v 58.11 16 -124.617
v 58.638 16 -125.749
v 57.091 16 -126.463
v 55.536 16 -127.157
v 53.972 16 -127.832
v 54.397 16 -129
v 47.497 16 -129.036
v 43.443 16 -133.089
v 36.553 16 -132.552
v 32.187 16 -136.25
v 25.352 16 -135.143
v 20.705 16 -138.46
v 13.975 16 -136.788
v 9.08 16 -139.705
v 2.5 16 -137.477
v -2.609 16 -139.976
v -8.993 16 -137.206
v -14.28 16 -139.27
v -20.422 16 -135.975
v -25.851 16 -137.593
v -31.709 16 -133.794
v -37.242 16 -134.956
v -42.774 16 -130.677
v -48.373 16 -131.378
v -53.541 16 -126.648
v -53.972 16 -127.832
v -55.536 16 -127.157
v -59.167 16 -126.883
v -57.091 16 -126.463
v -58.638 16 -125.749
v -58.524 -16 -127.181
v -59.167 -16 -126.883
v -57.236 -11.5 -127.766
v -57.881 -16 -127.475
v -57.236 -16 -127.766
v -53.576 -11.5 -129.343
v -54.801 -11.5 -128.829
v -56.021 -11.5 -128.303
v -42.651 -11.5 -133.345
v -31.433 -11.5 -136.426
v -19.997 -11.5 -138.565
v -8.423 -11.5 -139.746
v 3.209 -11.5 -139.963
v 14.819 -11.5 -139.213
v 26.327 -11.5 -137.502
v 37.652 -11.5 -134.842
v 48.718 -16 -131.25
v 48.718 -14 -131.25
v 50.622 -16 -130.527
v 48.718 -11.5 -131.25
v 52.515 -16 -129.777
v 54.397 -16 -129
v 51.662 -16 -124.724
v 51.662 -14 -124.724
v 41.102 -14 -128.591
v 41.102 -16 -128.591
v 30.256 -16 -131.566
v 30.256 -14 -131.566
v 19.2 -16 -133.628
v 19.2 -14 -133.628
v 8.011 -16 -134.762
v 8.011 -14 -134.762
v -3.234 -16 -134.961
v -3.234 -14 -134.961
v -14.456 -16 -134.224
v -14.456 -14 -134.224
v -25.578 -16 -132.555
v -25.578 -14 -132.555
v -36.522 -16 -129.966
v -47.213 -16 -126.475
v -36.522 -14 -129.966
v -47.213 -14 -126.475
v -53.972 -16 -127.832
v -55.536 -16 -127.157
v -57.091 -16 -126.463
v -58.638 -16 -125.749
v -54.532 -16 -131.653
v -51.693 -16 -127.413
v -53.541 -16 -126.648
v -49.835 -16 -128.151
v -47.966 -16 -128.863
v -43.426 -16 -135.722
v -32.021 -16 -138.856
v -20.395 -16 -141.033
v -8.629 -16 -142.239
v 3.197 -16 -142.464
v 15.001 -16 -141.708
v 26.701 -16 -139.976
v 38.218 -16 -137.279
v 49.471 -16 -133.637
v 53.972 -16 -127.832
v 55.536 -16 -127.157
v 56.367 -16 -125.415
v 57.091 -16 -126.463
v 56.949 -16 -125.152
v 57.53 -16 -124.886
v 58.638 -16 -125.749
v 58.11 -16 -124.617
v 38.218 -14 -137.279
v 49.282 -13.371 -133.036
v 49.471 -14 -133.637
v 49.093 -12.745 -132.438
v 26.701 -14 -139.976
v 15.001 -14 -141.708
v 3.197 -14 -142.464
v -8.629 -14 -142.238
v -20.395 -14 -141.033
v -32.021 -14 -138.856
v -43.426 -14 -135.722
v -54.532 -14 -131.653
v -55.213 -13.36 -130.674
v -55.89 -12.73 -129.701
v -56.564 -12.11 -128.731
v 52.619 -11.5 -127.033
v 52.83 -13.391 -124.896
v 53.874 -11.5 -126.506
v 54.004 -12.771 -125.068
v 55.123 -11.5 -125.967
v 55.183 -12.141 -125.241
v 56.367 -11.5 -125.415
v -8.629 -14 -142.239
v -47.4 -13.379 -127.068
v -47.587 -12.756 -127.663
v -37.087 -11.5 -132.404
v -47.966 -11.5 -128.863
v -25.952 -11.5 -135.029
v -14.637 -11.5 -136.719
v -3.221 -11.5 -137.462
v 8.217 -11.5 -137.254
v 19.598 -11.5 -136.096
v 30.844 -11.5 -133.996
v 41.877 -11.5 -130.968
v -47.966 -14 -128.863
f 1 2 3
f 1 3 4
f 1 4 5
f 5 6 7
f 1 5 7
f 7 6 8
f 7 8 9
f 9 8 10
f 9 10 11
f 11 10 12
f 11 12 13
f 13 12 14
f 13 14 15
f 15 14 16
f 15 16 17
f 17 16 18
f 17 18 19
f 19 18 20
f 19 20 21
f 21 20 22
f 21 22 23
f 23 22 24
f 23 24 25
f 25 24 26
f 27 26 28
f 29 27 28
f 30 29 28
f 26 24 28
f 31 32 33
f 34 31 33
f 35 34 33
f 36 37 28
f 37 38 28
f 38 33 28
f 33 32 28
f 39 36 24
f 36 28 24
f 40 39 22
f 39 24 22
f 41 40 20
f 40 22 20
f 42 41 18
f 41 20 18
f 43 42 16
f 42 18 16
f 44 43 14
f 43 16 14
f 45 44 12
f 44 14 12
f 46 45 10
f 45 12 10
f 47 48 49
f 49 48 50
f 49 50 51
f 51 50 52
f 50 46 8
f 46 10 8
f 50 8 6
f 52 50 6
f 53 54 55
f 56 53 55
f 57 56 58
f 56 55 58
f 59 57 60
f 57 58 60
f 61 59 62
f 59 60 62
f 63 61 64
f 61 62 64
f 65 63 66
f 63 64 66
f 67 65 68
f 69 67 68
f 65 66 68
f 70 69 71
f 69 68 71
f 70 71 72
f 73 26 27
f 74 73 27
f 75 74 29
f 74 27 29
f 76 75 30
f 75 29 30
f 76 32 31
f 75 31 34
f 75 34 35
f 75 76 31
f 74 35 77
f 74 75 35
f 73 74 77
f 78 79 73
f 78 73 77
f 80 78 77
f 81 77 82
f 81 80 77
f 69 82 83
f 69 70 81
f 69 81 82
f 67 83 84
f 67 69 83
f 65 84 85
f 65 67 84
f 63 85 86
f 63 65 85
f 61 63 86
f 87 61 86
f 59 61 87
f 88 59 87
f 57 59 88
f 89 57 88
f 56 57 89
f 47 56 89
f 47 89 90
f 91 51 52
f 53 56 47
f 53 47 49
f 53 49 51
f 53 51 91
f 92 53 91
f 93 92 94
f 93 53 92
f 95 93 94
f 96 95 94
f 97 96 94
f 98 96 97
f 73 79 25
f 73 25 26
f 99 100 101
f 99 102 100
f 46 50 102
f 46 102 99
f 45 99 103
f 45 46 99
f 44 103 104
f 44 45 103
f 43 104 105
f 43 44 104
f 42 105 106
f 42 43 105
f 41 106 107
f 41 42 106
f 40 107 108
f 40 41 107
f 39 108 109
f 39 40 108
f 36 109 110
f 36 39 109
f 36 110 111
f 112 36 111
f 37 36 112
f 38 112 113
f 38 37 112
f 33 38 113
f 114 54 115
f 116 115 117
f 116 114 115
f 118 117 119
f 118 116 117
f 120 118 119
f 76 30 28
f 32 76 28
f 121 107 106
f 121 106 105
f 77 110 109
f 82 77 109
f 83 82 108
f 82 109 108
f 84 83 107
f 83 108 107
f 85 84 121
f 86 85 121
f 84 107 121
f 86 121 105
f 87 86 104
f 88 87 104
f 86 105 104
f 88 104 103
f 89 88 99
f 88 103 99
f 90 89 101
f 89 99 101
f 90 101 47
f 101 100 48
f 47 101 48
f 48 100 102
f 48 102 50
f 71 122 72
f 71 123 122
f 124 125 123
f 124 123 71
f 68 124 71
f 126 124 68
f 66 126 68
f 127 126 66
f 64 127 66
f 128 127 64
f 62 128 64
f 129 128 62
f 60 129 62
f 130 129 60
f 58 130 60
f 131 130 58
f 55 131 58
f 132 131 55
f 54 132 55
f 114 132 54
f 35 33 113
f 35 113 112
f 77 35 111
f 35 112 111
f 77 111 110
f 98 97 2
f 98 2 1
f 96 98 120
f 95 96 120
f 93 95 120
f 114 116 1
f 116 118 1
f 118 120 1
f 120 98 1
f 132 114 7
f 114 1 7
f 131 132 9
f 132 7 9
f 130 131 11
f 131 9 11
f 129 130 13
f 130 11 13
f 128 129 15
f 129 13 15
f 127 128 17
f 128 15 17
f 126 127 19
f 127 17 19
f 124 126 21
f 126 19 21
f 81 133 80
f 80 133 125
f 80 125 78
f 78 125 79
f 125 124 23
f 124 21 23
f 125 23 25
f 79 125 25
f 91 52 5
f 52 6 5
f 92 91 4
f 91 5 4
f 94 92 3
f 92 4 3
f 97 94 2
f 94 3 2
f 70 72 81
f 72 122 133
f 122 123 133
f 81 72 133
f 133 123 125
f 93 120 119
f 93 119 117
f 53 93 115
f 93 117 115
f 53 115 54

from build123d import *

# Parameters (mm, degrees)
BOSS_EXTRUDE1_DEPTH = 16
BOSS_EXTRUDE2_START = -2
BOSS_EXTRUDE2_DEPTH = 2
CHAMFER2_SIZE       = 2.5


with BuildPart() as part:
    # Sketch2 → Boss-Extrude1 (new, symmetric)
    with BuildSketch(Plane(origin=(0, 0, 0), x_dir=(1, 0, 0), z_dir=(0, 1, 0))):
        with BuildLine():
            Line((-58.637924155, 125.749434155), (-59.166556644, 126.883090185))
            ThreePointArc((-59.166556644, 126.883090185), (-2.609123321, 139.975685301), (54.396940678, 128.999894748))
            Line((54.396940678, 128.999894748), (53.971953665, 127.832252528))
            ThreePointArc((53.971953665, 127.832252528), (56.314568974, 126.8124168), (58.637924155, 125.749434155))
            Line((58.637924155, 125.749434155), (58.110010989, 124.617320718))
            ThreePointArc((58.110010989, 124.617320718), (2.5, 137.477270849), (-53.540801289, 126.647671109))
            Line((-53.540801289, 126.647671109), (-53.971953665, 127.832252528))
            ThreePointArc((-53.971953665, 127.832252528), (-56.314568974, 126.8124168), (-58.637924155, 125.749434155))
        make_face()
    extrude(amount=BOSS_EXTRUDE1_DEPTH, both=True)

    # Sketch3 → Boss-Extrude2 (add)
    with BuildSketch(Plane.XZ.offset(16).offset(BOSS_EXTRUDE2_START)):
        with BuildLine():
            Line((49.470958786, -133.637099029), (48.718270464, -131.249876659))
            ThreePointArc((48.718270464, -131.249876659), (-2.609123321, -139.975685301), (-53.575680531, -129.343134552))
            Line((-53.575680531, -129.343134552), (-58.637924155, -125.749434155))
            Line((-58.637924155, -125.749434155), (-54.532389112, -131.652833383))
            ThreePointArc((-54.532389112, -131.652833383), (-2.718243325, -142.474071863), (49.470958786, -133.637099029))
        make_face()
        with BuildLine():
            Line((52.61897195, -127.033435721), (58.637924155, -125.749434155))
            Line((58.637924155, -125.749434155), (51.662263369, -124.723736889))
            ThreePointArc((51.662263369, -124.723736889), (2.390873136, -134.978826953), (-47.212790972, -126.475105727))
            Line((-47.212790972, -126.475105727), (-47.965548485, -128.86254754))
            ThreePointArc((-47.965548485, -128.86254754), (2.5, -137.477270849), (52.61897195, -127.033435721))
        make_face()
    extrude(amount=BOSS_EXTRUDE2_DEPTH)

    # Chamfer2
    chamfer2_edges = [part.edges().sort_by_distance(p)[0] for p in [
        (-4.601256001, -14, -139.924366867),
        (4.540431296, -14, -137.425014039),
    ]]
    chamfer(chamfer2_edges, length=CHAMFER2_SIZE - 0.0001)  # a hair under: the kernel refuses the full size


solid = part.part
